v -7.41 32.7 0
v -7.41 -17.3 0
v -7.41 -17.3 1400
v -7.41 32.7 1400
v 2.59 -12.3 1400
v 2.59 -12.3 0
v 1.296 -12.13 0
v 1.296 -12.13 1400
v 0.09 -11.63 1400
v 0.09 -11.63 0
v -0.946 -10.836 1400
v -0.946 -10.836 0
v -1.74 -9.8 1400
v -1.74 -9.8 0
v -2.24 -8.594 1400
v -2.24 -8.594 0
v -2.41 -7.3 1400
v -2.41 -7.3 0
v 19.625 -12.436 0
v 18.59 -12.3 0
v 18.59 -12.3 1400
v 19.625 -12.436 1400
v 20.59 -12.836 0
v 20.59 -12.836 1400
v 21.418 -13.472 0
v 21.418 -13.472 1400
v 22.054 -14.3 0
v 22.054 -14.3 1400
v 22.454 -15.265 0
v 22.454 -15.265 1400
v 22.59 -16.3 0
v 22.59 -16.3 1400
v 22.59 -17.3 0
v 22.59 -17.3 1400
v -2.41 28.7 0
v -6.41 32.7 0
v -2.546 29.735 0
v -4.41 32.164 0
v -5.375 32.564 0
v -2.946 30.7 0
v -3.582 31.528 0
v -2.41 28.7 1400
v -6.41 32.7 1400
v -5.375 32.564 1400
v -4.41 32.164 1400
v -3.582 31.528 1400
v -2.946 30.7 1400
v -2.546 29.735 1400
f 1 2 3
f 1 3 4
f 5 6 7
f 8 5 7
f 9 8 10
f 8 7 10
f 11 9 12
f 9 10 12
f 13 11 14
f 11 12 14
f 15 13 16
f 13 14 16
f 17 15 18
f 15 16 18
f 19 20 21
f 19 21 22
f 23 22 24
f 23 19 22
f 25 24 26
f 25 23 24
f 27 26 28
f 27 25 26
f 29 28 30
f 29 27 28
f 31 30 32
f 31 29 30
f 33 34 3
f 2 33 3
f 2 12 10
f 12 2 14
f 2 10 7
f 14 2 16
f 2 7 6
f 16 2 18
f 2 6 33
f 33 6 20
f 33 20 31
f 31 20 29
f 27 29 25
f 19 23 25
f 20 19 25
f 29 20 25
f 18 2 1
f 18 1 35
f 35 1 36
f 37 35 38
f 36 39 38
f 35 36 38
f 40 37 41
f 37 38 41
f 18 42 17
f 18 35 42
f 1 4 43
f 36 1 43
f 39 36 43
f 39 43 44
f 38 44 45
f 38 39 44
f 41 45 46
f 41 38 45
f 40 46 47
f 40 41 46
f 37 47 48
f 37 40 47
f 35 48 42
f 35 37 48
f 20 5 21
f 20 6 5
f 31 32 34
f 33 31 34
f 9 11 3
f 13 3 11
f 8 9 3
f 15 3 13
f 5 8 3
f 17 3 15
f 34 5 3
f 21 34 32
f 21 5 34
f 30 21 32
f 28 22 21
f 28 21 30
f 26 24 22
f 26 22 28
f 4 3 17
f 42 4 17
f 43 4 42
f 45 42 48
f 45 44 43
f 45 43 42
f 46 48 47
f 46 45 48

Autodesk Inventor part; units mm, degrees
ref_plane "YZ Plane" through (0, 0, 0) normal (1, 0, 0) x (0, 1, 0)
ref_plane "Start Plane" through (0, 0, 0) normal (0, 0, 1) x (1, 0, 0)
ref_plane "End Plane" through (0, 0, 1400) normal (0, 0, 1) x (1, 0, 0)
sketch "Sketch" plane through (0, 0, 0) normal (0, 0, 1) x (1, 0, 0)
  line L0 (-2.41, 28.7) -> (-2.41, -7.3)
  line L1 (-7.41, 32.7) -> (-6.41, 32.7)
  line L2 (-7.41, -17.3) -> (-7.41, 32.7)
  line L3 (22.59, -17.3) -> (-7.41, -17.3)
  line L4 (22.59, -16.3) -> (22.59, -17.3)
  line L5 (2.59, -12.3) -> (18.59, -12.3)
  arc A0 (-2.41, -7.3) -> (2.59, -12.3) centre (2.59, -7.3) ccw
  arc A1 (-2.41, 28.7) -> (-6.41, 32.7) centre (-6.41, 28.7) ccw
  arc A2 (22.59, -16.3) -> (18.59, -12.3) centre (18.59, -16.3) ccw
  line L6 (0, 43.6941) -> (0, -27.4657) construction
  line L7 (-13.5757, 0) -> (29.5841, 0) construction
  point P0 (-2.41, 32.7)
  point P1 (-2.41, -12.3)
  point P2 (22.59, -12.3)
  dimension "d4" = 30
  dimension "d6" = 50
  dimension "d8" = 5
  dimension "d10" = 5
  dimension "d17" = 5
  dimension "d18" = 4
  dimension "d19" = 17.3
  dimension "d20" = 7.41
extrude "Body" add sketch "Sketch" along normal up to surface (1400 mm away) from surface at 0
sketch "Sketch3" plane through (0, 0, 0) normal (0, 0, 1) x (1, 0, 0)
  line L0 (0, 0) -> (10, 0)
ref_plane "Work Plane10" through (0, 0, 0) normal (0, -1, 0) x (1, 0, 0)
sketch "Sketch4" plane through (0, 0, 0) normal (0, -1, 0) x (1, 0, 0)
  line L0 (-2, 0) -> (12, 0)
  line L1 (-2, 1400) -> (12, 1400)
  dimension "d24" = 1400
equation "\"d4\" = b"
equation "\"d6\" = ParH"
equation "\"d8\" = ParT"
equation "\"d10\" = ParT"
equation "\"d17\" = R"
equation "\"d18\" = R1"
equation "\"d19\" = ex"
equation "\"d20\" = ey"
equation "\"d11\" = G_L"
equation "\"b\" = 30"
equation "\"ParT\" = 5"
equation "\"R1\" = 4"
equation "\"G_L\" = d24"
equation "\"ParH\" = 50"
equation "\"R\" = 5"
equation "\"ey\" = 7.41"
equation "\"ex\" = 17.3"
equation "\"G_OFFSET_START\" = 0"
equation "\"G_OFFSET_END\" = 0"
properties part number "ISO 657-2 - 50x 30x 5-1400" material "Steel, Mild"
